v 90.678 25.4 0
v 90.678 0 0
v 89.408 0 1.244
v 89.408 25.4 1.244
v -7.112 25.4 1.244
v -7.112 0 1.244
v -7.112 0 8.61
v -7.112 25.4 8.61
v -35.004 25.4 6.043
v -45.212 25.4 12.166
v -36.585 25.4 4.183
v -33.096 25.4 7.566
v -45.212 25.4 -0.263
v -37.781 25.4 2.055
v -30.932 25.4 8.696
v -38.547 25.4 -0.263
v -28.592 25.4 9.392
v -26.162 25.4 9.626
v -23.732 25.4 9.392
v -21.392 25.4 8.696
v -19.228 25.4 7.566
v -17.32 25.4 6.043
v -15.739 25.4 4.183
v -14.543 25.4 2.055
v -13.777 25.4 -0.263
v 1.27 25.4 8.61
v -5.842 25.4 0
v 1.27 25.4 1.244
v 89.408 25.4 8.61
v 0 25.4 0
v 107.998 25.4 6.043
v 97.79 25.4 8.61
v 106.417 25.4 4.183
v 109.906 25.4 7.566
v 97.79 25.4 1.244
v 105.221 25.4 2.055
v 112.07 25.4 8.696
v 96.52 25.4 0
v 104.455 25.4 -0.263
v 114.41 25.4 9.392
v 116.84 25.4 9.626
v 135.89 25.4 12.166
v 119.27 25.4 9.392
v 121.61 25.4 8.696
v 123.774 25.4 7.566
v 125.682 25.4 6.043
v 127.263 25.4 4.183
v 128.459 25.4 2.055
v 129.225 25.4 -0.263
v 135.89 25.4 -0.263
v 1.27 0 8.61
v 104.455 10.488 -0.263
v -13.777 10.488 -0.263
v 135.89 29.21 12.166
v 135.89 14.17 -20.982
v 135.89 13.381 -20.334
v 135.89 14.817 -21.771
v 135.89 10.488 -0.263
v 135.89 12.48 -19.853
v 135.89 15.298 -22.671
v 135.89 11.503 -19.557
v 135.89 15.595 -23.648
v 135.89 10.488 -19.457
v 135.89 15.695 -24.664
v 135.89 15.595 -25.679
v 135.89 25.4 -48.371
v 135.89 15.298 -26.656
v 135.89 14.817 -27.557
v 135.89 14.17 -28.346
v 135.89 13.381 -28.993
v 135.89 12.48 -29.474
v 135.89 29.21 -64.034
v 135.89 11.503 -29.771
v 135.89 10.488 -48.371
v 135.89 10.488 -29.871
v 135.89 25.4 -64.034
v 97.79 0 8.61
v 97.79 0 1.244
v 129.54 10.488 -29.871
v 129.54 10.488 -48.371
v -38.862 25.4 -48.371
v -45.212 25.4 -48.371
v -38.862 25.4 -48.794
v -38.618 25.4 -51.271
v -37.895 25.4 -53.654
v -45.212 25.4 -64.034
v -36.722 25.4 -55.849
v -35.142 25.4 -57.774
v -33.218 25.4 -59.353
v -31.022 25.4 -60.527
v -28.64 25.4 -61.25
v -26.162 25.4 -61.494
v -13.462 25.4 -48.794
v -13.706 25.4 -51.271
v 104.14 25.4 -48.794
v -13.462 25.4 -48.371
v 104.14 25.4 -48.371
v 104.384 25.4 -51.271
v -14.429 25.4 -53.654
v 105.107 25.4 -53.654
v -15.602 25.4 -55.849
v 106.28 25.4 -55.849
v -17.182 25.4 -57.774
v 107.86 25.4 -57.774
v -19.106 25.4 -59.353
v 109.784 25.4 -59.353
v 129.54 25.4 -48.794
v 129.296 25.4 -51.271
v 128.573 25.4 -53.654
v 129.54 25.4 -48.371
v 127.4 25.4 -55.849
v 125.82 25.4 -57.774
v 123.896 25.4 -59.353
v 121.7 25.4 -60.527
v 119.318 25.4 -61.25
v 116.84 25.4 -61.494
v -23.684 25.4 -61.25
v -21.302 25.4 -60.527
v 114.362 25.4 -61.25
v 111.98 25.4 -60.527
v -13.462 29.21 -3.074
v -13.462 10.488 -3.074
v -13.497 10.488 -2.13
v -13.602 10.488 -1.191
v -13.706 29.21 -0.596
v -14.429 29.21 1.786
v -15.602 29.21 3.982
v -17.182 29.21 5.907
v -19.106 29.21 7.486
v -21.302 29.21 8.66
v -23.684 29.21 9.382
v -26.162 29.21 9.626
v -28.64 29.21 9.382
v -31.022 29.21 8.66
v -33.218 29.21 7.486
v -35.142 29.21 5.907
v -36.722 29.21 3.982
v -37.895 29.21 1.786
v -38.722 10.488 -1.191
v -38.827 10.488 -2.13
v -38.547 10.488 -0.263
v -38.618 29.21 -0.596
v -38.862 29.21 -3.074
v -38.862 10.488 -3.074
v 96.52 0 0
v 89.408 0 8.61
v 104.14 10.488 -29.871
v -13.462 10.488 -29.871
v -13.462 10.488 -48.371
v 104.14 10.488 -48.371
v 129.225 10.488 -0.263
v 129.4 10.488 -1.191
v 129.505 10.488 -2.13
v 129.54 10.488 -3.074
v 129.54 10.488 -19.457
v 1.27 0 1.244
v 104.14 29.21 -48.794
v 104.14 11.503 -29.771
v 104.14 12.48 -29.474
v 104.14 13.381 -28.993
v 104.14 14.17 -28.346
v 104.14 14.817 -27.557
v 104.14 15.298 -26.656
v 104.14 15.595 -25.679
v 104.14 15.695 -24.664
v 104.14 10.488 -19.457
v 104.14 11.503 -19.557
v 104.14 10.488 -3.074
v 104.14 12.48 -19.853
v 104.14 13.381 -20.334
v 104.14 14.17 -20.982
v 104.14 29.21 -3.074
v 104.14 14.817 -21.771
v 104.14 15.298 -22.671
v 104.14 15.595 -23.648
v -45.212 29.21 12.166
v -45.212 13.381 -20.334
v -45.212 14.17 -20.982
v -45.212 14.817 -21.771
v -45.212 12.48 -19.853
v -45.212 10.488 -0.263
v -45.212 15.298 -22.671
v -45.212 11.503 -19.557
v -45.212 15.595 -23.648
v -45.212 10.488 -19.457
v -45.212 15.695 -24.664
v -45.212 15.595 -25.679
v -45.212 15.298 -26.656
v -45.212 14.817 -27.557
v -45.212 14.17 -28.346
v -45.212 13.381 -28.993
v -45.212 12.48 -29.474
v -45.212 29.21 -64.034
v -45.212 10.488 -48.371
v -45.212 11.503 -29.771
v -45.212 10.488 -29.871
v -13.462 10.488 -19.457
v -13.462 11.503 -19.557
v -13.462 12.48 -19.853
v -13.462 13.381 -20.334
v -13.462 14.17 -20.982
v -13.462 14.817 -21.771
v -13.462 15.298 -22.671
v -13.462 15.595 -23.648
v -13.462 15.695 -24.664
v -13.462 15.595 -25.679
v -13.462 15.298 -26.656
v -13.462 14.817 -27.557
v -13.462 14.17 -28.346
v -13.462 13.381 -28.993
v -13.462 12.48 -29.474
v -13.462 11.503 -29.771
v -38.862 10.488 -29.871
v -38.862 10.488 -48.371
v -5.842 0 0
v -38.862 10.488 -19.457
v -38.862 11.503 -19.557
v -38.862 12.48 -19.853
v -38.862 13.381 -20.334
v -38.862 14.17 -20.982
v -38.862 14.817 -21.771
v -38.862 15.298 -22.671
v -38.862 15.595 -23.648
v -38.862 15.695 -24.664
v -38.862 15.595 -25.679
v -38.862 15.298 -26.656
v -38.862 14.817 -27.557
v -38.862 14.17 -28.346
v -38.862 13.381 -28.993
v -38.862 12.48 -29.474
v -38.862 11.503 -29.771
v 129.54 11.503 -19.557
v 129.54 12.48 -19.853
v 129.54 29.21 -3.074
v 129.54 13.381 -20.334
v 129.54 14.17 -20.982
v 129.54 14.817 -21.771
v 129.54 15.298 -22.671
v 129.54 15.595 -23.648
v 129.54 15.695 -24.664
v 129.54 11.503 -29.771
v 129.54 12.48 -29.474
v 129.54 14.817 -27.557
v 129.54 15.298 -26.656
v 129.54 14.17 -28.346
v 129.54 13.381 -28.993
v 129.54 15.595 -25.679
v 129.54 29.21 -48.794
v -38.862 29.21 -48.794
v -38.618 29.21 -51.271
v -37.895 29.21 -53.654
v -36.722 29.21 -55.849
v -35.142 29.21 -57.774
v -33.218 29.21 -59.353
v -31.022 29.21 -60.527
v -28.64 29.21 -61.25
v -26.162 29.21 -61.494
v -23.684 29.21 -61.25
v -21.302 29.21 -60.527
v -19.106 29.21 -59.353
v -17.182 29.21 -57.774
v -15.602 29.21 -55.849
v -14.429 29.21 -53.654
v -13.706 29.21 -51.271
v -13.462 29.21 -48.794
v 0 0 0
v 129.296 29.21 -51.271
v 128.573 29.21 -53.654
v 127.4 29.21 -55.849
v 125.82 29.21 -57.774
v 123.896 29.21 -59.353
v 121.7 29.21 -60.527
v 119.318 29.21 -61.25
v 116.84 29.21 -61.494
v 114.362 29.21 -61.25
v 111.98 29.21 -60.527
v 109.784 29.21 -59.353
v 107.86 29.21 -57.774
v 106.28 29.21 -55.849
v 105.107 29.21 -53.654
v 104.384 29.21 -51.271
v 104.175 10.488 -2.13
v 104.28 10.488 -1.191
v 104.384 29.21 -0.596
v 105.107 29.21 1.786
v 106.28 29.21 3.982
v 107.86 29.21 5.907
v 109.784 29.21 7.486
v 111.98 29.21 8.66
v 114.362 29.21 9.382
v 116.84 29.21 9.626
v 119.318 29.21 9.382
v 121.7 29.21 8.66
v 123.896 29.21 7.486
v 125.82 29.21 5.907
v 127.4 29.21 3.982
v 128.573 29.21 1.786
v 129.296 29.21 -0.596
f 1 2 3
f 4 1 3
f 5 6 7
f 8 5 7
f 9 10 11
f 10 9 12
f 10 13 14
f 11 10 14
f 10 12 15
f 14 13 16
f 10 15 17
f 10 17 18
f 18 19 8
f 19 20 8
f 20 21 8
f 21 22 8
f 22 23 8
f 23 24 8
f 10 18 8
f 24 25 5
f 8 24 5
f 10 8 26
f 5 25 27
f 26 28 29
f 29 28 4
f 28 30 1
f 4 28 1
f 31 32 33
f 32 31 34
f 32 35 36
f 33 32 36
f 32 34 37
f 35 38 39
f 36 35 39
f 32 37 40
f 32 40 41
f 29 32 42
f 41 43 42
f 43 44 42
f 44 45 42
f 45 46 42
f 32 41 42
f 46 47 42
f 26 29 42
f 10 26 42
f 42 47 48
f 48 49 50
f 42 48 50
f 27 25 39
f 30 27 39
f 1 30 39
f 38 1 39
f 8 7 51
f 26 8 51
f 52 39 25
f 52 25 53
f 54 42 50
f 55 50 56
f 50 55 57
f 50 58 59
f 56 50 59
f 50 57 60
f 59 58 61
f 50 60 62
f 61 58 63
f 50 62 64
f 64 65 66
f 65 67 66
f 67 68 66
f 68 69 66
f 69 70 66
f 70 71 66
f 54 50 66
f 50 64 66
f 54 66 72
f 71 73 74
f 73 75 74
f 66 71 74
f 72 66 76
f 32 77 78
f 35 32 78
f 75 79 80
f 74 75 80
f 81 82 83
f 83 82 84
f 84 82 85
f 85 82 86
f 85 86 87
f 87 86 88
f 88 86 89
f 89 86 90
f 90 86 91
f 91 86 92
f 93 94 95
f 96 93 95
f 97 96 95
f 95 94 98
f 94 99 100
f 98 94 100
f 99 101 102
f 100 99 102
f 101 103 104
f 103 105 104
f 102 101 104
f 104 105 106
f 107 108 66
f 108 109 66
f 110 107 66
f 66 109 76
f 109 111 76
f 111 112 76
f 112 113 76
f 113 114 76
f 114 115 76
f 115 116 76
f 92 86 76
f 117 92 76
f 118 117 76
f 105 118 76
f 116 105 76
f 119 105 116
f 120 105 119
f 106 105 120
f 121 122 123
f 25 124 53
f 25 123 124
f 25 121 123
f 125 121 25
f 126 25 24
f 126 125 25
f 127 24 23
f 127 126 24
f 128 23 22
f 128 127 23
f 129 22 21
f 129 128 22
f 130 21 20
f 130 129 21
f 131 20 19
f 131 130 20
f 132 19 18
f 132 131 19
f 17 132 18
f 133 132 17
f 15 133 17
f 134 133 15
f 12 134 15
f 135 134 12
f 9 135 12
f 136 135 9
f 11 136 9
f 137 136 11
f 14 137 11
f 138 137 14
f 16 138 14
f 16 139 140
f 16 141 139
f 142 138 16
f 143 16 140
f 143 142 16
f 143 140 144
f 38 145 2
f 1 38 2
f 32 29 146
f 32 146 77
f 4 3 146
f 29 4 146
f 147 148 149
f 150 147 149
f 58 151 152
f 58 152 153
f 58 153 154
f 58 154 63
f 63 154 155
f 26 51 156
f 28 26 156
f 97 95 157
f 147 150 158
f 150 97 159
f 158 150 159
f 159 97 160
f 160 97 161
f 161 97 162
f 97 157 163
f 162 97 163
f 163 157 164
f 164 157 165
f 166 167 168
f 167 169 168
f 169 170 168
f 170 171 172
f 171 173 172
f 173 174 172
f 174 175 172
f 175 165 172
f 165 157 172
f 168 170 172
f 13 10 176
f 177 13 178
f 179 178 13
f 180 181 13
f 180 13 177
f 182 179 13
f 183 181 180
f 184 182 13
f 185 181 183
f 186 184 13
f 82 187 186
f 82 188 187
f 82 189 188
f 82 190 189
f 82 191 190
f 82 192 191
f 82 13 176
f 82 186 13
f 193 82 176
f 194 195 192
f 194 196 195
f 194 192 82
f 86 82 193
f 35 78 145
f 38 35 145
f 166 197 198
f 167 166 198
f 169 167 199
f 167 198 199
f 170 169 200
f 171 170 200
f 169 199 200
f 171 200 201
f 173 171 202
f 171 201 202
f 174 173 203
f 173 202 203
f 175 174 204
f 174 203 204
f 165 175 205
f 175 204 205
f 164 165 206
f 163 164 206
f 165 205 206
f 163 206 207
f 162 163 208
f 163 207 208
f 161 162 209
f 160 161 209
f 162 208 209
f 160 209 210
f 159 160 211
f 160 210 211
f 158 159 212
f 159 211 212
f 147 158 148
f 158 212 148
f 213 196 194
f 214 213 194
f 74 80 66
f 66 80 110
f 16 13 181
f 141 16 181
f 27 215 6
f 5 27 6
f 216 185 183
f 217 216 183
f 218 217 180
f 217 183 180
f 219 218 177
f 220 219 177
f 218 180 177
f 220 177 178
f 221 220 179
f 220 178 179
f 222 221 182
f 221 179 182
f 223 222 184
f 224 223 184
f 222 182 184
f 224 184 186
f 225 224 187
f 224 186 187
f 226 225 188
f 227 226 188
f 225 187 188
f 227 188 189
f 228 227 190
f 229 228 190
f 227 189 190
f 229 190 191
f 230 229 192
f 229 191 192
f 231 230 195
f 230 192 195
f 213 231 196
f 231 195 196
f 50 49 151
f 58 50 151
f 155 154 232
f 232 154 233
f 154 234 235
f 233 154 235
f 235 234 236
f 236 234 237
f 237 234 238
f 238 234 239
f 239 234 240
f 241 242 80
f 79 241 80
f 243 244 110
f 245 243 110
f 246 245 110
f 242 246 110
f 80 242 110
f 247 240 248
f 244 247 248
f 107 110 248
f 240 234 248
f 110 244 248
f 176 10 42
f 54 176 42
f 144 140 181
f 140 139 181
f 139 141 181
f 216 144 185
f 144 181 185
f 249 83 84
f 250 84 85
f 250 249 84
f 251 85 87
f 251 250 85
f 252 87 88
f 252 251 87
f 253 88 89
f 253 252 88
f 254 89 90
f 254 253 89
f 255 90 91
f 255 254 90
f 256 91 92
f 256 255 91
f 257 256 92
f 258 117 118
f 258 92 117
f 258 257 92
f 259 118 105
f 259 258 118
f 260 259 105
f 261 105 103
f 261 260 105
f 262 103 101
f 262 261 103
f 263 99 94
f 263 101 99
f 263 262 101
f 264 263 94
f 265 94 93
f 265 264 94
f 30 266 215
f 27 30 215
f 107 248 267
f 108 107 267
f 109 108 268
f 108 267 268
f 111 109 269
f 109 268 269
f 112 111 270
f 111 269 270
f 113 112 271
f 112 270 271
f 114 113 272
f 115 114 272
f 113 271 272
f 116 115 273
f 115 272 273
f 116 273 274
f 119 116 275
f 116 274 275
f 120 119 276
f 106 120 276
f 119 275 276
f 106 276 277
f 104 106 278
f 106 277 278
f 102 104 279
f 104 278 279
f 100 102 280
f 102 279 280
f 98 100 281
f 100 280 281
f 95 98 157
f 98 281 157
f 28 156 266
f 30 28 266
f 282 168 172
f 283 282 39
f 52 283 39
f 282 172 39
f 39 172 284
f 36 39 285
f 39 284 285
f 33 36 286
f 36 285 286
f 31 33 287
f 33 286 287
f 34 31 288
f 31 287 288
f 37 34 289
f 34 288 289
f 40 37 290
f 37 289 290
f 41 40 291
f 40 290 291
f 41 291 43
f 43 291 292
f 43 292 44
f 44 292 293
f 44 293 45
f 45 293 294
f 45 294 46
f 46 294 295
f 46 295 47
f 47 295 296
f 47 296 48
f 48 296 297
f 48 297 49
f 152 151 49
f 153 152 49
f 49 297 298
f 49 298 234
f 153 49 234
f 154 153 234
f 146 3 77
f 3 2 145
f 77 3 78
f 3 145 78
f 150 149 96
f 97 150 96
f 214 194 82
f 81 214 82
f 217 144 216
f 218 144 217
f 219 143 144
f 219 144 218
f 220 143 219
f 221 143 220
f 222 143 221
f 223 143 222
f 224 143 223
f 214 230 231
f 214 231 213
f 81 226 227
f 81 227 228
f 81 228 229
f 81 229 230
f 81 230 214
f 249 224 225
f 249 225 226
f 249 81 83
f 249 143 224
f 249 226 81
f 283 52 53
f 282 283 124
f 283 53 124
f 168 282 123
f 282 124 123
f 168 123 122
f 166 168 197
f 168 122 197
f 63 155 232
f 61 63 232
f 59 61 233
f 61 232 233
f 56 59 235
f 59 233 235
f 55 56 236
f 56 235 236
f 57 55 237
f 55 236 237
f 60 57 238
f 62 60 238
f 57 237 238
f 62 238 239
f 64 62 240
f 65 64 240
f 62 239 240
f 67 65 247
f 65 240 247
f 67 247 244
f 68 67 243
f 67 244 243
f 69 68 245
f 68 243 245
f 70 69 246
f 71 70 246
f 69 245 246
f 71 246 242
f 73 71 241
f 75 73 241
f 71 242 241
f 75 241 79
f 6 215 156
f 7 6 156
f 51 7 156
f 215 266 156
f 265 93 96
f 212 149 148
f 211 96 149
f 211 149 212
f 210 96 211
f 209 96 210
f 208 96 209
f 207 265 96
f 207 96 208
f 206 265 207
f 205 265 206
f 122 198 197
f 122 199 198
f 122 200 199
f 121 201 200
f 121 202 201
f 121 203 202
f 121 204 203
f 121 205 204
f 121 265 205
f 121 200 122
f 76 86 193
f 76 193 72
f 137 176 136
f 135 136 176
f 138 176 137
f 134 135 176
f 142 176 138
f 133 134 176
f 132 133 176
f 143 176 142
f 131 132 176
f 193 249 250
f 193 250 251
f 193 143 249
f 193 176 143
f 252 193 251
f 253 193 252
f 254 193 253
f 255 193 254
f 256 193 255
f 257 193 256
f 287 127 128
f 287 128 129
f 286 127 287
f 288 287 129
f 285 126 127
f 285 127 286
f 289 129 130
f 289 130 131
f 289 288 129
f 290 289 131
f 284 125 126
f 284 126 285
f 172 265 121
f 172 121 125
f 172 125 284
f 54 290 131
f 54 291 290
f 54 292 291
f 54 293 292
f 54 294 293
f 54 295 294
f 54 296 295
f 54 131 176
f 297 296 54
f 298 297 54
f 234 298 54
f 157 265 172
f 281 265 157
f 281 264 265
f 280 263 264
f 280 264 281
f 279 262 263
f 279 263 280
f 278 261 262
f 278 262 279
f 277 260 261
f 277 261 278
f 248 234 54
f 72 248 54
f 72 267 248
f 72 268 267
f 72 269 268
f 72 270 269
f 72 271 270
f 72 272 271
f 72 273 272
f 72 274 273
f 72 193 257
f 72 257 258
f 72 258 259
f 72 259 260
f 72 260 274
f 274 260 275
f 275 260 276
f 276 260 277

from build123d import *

# Parameters (mm, degrees)
GUIDE_RODS_DEPTH   = 25.4
GUIDE_RODS_2_DEPTH = 25.4
SKETCH2_W          = 181.102
SKETCH2_H          = 76.2
BASEPLATE_DEPTH    = 3.81
ROD_CUP_DEPTH      = 181.102
HANDLES_DEPTH      = 154.034720609


with BuildPart() as part:
    # Sketch1 → Guide rods (new body)
    with BuildSketch(Plane(origin=(0, 0, 0), x_dir=(1, 0, 0), z_dir=(0, 1, 0))):
        Polygon((-5.842, 0), (-7.112, -1.244340789), (-7.112, -8.610340789), (1.27, -8.610340789), (1.27, -1.244340789), (0, 0), align=None)
    extrude(amount=GUIDE_RODS_DEPTH)



with BuildPart() as body_2:
    # Sketch1 → Guide rods 2 (new body)
    with BuildSketch(Plane(origin=(0, 0, 0), x_dir=(1, 0, 0), z_dir=(0, 1, 0))):
        Polygon((90.678, 0), (89.408, -1.244340789), (89.408, -8.610340789), (97.79, -8.610340789), (97.79, -1.244340789), (96.52, 0), align=None)
    extrude(amount=GUIDE_RODS_2_DEPTH)


with BuildPart() as part_1:
    add(part.part)

    add(body_2.part)  # baseplate merges body 2
    # Sketch2 → baseplate (add)
    with BuildSketch(Plane(origin=(0, 25.4, 0), x_dir=(1, 0, 0), z_dir=(0, 1, 0))):
        with Locations((45.339, 25.933659211)):
            Rectangle(SKETCH2_W, SKETCH2_H)
    extrude(amount=BASEPLATE_DEPTH)

    # Sketch3 → rod cup (add)
    with BuildSketch(Plane.ZY.offset(45.212)):
        with BuildLine():
            Line((-48.370526129, 25.4), (-0.263262521, 25.4))
            Line((-0.263262521, 25.4), (-0.263262521, 10.48765464))
            Line((-0.263262521, 10.48765464), (-19.456659211, 10.48765464))
            ThreePointArc((-19.456659211, 10.48765464), (-24.663659211, 15.69465464), (-29.870659211, 10.48765464))
            Line((-29.870659211, 10.48765464), (-48.370526129, 10.48765464))
            Line((-48.370526129, 10.48765464), (-48.370526129, 25.4))
        make_face()
    extrude(amount=-ROD_CUP_DEPTH)

    # Sketch4 → Handles (cut, through all)
    with BuildSketch(Plane(origin=(0, 29.21, 0), x_dir=(1, 0, 0), z_dir=(0, 1, 0))):
        with BuildLine():
            Line((-13.462, 48.793659211), (-13.462, 3.073659211))
            ThreePointArc((-13.462, 3.073659211), (-26.162, -9.626340789), (-38.862, 3.073659211))
            Line((-38.862, 3.073659211), (-38.862, 48.793659211))
            ThreePointArc((-38.862, 48.793659211), (-26.162, 61.493659211), (-13.462, 48.793659211))
        make_face()
        with BuildLine():
            Line((104.14, 48.793659211), (104.14, 3.073659211))
            ThreePointArc((104.14, 3.073659211), (116.84, -9.626340789), (129.54, 3.073659211))
            Line((129.54, 3.073659211), (129.54, 48.793659211))
            ThreePointArc((129.54, 48.793659211), (116.84, 61.493659211), (104.14, 48.793659211))
        make_face()
    extrude(amount=-HANDLES_DEPTH, mode=Mode.SUBTRACT)


solid = part_1.part
